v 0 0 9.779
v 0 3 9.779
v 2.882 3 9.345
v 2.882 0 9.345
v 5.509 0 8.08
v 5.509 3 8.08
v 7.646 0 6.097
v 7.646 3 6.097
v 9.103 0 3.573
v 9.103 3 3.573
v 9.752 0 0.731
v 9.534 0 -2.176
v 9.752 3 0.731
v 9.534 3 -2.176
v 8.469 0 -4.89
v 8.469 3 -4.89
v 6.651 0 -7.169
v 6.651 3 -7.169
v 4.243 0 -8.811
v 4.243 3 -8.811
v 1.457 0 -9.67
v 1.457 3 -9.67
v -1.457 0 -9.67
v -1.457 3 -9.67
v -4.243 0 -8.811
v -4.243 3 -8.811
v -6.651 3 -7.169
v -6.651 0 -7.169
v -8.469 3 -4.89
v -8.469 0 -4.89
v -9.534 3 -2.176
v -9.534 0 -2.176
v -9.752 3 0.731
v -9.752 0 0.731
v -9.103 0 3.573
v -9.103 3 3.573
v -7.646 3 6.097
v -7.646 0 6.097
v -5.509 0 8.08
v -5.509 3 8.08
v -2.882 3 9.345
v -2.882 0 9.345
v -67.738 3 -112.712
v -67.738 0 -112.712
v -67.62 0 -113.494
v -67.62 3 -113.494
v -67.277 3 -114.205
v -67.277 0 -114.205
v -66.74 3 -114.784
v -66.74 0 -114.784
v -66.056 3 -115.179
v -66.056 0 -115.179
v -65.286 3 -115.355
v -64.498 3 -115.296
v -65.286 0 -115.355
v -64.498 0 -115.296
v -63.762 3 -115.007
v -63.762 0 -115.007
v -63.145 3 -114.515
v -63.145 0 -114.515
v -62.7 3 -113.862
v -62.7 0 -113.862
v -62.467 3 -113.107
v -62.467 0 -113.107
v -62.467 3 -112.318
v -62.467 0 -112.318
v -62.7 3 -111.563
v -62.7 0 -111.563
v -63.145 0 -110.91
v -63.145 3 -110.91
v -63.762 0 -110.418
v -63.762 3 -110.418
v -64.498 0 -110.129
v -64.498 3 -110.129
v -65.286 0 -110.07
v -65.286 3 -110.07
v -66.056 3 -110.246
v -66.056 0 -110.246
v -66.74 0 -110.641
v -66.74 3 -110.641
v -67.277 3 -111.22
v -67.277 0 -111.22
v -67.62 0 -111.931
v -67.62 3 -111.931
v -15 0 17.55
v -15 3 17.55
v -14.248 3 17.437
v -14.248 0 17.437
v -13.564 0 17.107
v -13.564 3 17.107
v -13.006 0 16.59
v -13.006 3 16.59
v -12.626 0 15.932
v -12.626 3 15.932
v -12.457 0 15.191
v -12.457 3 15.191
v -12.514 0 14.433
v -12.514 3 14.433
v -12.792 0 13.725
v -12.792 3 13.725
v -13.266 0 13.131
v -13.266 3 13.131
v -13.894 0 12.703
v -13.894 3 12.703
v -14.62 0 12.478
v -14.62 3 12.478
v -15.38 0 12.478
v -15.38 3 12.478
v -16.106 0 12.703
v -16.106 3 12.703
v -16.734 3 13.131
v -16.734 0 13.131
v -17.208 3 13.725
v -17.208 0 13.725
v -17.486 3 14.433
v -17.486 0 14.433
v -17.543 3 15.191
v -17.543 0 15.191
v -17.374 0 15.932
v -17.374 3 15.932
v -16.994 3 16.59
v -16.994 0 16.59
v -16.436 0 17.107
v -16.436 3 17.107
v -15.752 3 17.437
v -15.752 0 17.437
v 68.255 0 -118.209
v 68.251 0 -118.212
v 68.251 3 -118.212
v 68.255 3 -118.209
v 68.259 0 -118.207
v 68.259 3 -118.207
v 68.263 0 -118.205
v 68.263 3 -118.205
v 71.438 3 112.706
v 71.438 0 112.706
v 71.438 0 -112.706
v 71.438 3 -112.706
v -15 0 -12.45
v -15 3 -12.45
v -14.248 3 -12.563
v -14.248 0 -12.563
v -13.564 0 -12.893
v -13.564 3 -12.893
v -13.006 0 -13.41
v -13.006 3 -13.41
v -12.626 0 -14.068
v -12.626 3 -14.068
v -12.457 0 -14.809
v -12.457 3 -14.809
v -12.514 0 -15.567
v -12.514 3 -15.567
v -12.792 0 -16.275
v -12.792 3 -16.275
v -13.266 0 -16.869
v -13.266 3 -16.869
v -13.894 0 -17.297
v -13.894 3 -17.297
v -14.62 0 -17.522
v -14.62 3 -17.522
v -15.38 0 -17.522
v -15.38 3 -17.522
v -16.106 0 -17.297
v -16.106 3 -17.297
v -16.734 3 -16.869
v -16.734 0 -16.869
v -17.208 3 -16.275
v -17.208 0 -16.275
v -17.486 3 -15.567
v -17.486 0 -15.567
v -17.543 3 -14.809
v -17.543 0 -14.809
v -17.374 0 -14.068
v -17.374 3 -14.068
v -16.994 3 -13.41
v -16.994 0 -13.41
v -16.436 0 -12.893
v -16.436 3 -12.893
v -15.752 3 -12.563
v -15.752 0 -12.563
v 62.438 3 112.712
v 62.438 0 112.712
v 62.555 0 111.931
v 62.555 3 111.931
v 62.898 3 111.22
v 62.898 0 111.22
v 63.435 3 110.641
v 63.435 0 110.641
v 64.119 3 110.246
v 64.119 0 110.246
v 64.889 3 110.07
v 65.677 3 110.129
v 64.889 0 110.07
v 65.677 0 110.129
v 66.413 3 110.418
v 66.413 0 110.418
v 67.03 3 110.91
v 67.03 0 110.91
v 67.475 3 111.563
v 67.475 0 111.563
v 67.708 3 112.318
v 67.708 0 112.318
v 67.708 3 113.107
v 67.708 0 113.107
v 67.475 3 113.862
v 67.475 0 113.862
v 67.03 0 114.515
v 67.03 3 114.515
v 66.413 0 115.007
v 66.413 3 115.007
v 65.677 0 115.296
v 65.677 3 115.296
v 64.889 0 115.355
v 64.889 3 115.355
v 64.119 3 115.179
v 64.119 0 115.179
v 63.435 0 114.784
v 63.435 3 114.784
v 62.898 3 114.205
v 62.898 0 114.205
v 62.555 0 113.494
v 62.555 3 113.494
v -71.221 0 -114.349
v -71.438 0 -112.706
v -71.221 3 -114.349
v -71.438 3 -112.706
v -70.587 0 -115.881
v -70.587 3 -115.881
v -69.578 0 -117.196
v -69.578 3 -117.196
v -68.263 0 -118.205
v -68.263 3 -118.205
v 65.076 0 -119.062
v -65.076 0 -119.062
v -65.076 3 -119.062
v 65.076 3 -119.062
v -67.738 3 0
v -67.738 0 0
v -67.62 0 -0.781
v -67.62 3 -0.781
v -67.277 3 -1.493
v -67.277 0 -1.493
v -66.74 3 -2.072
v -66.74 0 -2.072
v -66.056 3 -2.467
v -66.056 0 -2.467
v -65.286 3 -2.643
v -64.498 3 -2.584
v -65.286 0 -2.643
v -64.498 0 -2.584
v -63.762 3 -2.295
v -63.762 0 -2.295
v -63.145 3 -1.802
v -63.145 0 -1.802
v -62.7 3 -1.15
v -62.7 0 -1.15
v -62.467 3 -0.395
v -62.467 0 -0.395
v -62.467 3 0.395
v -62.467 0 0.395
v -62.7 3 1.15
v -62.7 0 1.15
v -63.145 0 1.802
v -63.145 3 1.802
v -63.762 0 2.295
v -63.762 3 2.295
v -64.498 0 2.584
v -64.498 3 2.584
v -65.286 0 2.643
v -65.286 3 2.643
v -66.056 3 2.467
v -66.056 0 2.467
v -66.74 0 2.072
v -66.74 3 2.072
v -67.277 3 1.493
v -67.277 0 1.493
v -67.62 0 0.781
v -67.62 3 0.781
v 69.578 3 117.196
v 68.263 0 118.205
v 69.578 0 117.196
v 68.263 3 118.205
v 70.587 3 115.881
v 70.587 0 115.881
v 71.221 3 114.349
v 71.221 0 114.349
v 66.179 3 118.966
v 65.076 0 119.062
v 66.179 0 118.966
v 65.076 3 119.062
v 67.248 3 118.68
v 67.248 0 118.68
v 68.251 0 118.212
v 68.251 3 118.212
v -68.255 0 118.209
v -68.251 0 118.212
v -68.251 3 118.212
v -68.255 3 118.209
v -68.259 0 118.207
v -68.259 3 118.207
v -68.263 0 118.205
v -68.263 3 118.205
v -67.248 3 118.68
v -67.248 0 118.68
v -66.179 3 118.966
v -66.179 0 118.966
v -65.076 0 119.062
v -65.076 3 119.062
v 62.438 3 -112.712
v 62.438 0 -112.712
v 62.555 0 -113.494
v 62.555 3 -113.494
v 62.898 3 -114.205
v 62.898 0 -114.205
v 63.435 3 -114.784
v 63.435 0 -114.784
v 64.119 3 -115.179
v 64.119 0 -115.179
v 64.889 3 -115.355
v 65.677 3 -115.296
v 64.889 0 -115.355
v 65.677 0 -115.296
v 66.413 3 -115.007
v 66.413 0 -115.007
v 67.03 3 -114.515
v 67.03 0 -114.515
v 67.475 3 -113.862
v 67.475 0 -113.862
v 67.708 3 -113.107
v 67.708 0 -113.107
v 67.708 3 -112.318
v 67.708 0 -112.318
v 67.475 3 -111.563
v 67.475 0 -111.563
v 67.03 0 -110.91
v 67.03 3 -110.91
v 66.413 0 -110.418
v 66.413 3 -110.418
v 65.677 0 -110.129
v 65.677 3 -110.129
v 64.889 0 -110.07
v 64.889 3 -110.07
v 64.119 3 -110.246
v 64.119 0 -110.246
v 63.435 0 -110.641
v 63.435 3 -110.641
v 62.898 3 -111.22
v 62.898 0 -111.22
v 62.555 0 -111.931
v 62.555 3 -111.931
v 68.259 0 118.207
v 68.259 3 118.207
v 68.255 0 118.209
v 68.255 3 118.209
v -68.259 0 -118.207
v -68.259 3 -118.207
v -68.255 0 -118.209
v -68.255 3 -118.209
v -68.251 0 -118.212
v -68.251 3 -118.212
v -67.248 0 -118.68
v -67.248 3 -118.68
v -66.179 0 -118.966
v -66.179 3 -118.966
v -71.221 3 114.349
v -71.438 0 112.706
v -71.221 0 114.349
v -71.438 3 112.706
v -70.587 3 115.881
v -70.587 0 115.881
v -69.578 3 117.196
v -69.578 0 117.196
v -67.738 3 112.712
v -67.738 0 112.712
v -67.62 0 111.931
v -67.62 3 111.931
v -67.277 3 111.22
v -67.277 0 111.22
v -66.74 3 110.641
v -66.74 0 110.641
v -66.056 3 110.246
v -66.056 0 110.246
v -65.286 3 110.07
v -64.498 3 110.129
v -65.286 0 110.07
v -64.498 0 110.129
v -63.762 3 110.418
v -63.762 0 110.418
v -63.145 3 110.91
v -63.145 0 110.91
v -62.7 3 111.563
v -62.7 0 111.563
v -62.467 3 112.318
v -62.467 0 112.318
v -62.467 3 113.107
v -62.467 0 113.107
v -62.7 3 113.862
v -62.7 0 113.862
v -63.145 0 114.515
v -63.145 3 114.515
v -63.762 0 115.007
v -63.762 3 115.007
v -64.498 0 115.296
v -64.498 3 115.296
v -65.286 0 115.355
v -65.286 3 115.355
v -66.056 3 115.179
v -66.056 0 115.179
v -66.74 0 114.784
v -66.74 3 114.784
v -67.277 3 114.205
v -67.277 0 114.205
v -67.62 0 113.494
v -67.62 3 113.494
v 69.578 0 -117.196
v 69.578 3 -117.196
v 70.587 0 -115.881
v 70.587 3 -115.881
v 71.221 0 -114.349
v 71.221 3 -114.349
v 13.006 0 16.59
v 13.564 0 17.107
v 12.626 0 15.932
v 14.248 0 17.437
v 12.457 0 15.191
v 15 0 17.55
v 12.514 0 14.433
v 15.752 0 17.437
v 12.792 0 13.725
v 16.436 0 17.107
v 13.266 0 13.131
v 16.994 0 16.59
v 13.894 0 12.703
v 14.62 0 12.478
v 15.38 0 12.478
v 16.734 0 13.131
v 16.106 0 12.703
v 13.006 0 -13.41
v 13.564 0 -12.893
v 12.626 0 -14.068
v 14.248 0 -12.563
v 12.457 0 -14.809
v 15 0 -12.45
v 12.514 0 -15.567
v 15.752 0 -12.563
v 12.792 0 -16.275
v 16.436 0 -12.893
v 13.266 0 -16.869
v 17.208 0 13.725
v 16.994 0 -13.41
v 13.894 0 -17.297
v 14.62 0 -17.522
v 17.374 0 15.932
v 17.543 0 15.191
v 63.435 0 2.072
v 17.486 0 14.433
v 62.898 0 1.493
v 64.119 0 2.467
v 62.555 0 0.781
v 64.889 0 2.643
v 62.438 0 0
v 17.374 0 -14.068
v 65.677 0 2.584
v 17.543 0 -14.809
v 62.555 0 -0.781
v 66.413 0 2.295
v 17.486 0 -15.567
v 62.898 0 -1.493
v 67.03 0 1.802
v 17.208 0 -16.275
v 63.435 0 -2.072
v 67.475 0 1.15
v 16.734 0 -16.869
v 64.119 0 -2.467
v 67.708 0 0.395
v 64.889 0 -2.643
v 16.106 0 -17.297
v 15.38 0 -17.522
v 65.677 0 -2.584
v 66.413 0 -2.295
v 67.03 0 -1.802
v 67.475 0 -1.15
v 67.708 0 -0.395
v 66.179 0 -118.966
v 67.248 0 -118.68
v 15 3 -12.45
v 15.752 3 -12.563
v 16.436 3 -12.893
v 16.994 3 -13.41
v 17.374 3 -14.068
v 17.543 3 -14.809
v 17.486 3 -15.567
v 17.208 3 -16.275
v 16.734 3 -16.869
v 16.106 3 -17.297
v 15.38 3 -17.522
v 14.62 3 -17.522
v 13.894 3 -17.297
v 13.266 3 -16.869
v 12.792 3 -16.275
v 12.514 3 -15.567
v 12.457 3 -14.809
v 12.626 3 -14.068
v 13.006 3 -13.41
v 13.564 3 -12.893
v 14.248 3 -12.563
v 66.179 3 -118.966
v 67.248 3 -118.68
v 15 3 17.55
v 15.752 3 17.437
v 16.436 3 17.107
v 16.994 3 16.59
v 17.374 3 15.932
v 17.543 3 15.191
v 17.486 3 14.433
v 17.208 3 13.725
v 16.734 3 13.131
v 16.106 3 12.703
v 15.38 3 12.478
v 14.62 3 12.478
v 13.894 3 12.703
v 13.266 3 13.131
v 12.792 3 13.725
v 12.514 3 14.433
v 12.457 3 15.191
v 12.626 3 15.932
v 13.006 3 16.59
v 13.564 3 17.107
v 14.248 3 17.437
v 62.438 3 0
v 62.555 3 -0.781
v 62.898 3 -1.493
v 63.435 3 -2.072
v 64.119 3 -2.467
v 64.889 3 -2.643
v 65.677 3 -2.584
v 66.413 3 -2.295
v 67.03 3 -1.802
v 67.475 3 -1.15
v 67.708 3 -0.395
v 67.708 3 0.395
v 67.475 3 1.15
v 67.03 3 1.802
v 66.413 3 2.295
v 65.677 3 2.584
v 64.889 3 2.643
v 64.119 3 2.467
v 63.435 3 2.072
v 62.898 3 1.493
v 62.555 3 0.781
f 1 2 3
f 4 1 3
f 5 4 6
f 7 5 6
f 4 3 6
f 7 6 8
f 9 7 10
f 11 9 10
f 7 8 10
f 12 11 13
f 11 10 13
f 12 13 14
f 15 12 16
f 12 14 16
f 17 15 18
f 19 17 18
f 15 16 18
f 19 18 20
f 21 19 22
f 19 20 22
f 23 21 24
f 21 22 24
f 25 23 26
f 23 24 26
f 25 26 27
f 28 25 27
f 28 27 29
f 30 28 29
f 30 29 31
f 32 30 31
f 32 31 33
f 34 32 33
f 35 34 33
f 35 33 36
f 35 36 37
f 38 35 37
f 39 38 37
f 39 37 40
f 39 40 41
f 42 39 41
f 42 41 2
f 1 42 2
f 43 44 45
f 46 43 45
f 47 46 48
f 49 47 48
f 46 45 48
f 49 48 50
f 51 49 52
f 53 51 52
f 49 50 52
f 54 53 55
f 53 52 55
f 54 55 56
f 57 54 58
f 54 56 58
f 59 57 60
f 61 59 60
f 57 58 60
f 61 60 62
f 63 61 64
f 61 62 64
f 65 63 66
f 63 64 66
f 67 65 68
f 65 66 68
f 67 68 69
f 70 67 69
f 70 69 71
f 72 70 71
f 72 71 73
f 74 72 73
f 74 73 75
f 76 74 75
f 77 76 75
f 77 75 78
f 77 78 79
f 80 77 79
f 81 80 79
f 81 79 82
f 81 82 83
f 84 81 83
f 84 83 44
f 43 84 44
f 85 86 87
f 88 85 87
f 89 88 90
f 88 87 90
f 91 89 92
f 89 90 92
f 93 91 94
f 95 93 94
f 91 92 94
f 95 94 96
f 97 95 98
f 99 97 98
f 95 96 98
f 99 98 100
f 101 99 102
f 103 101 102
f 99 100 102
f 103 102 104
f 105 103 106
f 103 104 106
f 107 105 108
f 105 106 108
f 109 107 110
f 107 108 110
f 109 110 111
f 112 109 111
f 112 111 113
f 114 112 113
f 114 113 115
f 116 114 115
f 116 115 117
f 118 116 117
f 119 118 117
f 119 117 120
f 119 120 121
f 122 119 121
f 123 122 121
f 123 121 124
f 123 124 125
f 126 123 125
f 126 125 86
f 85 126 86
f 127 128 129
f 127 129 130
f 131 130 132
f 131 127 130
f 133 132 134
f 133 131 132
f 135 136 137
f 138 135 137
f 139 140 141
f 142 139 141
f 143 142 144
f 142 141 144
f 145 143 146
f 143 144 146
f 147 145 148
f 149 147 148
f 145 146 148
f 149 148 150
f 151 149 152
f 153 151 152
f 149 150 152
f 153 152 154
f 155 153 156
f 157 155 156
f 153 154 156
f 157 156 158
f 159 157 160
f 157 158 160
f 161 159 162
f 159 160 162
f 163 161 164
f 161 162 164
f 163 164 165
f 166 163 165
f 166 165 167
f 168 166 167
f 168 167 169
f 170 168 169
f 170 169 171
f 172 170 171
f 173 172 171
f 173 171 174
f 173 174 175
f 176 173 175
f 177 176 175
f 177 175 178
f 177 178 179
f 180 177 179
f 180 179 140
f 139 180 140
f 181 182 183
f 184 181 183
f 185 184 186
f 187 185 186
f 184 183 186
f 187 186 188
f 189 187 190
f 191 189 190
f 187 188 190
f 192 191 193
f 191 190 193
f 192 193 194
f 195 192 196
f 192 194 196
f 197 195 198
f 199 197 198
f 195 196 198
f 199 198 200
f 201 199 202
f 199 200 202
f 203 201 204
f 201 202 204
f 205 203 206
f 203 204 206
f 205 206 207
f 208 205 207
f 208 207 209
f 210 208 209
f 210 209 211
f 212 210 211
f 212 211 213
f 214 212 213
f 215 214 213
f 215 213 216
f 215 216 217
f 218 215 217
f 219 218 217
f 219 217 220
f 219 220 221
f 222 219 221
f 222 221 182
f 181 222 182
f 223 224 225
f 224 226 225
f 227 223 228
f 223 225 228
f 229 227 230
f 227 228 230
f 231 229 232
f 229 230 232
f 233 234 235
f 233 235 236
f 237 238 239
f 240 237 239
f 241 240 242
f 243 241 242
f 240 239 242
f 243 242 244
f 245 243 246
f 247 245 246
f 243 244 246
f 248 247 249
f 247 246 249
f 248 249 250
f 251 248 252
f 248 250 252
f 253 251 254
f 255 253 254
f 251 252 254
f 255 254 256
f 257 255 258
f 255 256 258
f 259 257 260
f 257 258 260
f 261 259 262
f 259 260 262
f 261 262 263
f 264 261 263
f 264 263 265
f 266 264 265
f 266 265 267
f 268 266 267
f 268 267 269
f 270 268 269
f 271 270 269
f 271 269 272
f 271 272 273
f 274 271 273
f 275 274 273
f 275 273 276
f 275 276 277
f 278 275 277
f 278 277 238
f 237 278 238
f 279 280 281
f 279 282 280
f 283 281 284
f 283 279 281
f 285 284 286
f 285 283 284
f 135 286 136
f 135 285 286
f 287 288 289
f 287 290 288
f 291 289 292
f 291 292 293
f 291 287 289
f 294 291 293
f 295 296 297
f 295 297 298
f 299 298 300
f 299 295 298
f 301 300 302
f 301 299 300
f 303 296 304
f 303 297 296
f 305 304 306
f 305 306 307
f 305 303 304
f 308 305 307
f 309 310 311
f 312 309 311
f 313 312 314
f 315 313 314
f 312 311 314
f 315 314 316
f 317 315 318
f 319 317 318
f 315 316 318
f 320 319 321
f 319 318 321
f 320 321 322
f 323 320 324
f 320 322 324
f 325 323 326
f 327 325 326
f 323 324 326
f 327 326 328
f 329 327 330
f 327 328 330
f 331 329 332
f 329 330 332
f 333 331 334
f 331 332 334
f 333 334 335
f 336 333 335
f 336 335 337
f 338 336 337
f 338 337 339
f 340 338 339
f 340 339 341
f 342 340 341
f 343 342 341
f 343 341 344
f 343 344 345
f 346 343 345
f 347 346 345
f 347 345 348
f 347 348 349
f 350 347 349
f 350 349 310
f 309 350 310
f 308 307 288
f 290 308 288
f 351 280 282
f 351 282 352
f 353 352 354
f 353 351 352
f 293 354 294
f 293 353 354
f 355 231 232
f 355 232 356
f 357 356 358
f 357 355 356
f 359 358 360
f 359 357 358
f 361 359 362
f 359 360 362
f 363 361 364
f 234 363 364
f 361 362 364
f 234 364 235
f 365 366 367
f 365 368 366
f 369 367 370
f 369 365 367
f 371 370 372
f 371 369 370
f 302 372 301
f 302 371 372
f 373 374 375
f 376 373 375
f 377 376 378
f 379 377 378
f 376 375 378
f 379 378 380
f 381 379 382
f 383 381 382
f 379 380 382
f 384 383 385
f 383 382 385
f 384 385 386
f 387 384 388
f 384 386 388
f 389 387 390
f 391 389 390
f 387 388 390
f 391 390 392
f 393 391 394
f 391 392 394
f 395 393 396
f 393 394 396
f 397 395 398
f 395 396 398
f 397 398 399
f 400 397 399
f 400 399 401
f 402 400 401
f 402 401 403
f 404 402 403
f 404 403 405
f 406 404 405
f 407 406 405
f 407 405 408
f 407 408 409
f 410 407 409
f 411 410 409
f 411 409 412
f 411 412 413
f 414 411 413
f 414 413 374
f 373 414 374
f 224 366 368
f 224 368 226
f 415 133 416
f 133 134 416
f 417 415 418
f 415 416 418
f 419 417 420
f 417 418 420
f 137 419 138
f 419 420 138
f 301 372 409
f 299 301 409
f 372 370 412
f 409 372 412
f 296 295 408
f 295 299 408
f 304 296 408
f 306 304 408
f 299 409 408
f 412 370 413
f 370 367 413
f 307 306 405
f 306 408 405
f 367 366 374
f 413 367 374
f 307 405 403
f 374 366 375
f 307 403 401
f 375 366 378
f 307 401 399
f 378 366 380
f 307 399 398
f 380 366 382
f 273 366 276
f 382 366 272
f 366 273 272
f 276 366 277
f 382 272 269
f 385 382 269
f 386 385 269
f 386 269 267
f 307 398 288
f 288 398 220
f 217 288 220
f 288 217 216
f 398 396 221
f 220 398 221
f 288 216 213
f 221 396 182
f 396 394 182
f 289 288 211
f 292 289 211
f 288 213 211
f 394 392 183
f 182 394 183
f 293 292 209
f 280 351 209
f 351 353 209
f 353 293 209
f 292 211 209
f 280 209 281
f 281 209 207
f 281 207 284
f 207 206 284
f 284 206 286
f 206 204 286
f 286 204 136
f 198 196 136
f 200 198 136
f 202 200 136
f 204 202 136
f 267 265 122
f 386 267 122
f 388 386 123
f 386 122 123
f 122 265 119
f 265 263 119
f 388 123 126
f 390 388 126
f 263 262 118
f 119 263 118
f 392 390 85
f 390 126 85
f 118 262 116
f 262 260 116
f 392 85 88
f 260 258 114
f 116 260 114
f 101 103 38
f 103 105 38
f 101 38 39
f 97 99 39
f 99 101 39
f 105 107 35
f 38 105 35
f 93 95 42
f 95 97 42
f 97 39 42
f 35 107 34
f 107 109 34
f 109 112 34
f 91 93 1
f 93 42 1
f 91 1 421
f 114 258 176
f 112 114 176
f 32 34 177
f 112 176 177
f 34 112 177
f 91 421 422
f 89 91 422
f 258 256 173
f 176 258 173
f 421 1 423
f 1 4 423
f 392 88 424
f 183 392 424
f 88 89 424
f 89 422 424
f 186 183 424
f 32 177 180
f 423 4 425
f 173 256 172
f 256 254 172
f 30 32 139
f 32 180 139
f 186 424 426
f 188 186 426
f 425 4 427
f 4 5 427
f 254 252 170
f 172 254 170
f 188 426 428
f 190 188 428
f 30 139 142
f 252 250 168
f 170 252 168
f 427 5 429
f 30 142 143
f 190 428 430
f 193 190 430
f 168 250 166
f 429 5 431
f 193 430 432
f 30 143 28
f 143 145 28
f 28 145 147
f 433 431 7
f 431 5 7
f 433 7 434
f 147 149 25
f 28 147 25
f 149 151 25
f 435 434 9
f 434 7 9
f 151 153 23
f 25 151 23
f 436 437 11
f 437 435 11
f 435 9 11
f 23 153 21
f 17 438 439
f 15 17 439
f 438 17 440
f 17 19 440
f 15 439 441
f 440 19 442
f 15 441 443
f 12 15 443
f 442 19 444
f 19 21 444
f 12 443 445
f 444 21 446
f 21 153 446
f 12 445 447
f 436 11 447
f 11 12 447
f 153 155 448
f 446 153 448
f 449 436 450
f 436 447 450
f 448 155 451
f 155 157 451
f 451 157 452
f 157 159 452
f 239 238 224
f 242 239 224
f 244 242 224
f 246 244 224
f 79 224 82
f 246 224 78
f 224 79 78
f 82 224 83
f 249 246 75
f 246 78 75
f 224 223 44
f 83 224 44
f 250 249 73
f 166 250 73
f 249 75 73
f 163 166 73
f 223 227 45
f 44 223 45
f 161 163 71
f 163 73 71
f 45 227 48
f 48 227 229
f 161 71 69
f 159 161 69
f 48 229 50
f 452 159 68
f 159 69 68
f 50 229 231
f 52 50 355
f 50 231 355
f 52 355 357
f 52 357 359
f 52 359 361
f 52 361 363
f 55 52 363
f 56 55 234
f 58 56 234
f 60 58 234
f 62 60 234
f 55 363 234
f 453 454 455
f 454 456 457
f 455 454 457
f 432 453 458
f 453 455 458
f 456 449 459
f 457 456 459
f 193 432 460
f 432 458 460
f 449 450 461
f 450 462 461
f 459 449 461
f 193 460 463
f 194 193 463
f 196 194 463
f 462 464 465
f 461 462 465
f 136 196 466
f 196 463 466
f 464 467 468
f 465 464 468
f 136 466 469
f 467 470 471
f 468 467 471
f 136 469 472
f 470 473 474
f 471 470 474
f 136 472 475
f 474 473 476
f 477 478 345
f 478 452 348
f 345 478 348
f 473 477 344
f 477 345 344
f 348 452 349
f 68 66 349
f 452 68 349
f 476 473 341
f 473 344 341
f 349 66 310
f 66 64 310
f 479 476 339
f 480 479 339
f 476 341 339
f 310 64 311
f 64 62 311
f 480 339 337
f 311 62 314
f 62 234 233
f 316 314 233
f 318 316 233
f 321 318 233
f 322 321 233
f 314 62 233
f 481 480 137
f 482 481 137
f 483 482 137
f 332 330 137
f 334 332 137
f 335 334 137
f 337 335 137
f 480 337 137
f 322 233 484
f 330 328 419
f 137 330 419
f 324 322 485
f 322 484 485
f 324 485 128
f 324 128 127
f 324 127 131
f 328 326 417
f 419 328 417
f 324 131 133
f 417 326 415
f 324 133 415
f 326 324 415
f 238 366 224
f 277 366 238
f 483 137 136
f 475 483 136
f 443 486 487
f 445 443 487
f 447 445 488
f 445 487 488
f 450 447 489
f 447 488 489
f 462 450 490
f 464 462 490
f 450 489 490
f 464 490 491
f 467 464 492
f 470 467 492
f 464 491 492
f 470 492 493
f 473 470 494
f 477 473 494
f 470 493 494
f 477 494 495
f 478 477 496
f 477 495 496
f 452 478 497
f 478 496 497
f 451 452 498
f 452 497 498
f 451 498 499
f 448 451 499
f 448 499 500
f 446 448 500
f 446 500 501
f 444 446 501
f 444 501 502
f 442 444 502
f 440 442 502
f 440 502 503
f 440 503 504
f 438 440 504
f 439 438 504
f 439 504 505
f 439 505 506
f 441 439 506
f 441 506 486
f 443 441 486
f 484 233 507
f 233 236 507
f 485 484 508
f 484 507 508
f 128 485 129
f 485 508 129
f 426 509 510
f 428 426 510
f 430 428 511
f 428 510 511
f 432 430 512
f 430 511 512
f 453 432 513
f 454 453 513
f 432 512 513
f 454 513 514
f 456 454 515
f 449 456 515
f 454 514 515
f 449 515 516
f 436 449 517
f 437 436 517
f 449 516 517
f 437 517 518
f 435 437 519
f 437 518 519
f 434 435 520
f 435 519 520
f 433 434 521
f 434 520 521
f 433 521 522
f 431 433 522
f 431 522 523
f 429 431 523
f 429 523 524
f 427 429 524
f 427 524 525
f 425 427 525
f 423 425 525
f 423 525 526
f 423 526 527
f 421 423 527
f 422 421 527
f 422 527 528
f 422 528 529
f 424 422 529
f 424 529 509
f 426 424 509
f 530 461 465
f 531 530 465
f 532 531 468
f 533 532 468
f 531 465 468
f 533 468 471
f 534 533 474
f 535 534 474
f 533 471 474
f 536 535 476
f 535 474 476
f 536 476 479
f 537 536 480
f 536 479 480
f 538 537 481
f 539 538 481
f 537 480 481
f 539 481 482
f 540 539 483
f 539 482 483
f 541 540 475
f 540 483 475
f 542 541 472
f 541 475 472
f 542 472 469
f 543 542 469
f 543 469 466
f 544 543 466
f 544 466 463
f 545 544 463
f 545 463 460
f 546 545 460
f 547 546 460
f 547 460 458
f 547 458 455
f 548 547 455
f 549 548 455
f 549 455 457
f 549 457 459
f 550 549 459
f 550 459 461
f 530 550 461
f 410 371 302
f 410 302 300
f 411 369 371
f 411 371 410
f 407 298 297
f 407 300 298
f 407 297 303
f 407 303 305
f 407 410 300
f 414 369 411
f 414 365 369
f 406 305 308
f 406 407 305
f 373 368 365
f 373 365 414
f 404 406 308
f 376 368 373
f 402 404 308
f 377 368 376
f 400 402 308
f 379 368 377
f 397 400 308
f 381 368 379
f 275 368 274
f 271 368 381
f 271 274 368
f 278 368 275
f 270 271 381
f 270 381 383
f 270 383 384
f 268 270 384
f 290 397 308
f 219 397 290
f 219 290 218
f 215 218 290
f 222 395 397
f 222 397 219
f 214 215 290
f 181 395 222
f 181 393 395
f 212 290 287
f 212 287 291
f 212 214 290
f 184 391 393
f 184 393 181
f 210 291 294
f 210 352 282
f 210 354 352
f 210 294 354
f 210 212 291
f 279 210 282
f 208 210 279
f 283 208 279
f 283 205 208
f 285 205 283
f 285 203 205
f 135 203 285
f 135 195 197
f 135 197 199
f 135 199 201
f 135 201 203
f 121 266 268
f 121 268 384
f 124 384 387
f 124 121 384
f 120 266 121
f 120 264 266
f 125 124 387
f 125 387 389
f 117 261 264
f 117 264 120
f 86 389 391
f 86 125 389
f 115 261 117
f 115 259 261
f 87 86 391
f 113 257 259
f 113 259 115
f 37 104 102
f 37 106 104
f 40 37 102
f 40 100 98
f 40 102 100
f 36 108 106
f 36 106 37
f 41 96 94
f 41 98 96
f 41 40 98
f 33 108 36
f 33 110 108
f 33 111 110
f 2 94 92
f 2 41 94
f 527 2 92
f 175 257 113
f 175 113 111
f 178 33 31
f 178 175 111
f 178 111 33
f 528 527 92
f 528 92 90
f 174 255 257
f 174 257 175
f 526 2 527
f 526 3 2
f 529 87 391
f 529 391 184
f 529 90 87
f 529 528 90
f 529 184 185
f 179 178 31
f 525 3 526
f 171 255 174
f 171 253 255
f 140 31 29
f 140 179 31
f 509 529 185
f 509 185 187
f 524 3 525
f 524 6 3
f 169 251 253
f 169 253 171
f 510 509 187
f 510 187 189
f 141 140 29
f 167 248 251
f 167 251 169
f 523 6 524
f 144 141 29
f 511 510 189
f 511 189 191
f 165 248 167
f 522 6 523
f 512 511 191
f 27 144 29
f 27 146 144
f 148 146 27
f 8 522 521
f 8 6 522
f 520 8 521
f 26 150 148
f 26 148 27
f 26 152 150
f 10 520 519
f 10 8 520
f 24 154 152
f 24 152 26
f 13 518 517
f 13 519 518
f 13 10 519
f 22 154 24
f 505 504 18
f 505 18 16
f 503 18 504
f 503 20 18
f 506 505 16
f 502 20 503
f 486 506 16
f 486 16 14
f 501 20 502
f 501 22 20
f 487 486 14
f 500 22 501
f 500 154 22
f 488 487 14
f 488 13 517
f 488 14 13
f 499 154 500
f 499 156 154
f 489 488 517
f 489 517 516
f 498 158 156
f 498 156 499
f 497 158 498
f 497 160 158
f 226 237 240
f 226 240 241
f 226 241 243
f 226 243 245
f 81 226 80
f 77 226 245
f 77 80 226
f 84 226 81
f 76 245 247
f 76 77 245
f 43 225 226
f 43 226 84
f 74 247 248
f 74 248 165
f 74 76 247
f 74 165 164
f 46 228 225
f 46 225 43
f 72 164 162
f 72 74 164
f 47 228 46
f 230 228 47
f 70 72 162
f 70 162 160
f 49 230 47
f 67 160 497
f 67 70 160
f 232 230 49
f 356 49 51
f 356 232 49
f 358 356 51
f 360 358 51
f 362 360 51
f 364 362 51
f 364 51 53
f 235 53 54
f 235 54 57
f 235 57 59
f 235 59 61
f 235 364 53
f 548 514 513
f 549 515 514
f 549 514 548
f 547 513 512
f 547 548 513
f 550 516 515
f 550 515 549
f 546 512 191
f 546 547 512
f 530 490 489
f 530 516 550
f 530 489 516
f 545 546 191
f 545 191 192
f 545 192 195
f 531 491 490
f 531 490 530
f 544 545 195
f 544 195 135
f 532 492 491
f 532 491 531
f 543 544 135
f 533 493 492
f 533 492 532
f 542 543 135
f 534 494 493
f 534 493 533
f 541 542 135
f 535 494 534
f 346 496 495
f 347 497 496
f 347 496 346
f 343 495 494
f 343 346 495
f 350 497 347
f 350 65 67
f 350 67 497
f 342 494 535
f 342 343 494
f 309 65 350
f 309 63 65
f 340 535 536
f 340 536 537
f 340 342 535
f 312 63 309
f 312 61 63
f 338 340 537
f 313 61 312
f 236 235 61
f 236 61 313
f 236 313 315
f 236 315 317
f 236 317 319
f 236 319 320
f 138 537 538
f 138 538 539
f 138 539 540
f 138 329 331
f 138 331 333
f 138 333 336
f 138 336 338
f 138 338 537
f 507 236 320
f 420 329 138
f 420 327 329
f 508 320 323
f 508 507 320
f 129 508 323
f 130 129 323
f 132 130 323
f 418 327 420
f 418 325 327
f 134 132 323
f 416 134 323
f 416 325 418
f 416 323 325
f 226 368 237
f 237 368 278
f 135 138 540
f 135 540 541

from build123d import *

# Parameters (mm, degrees)
SKETCH1_W            = 142.875
SKETCH1_H            = 238.125
BOSS_EXTRUDE1_DEPTH  = 3
CUT_EXTRUDE1_START   = -3
CUT_EXTRUDE1_DEPTH   = 3
M5_CLEARANCE_HOLE1_D = 5.3
SKETCH5_R            = 9.779
SKETCH5_R_2          = 2.55
CUT_EXTRUDE2_DEPTH   = 139.881947396
FILLET1_R            = 6.35


# Read off the part's stored shape, not the designer's step: Cut-Extrude1
with BuildPart() as part:
    # Sketch1 → Boss-Extrude1 (new body)
    with BuildSketch(Plane(origin=(0, 0, 0), x_dir=(1, 0, 0), z_dir=(0, 1, 0))):
        Rectangle(SKETCH1_W, SKETCH1_H)
    extrude(amount=BOSS_EXTRUDE1_DEPTH)

    # Cut-Extrude1 outline → Cut-Extrude1 (cut)
    with BuildSketch(Plane(origin=(0, 3, 0), x_dir=(1, 0, 0), z_dir=(0, 1, 0)).offset(CUT_EXTRUDE1_START)):
        with BuildLine():
            ThreePointArc((71.4375, -116.313944107), (69.11044358, -117.711497264), (66.756056607, -119.0625))
            Line((66.756056607, -119.0625), (71.4375, -119.0625))
            Line((71.4375, -119.0625), (71.4375, -116.313944107))
        make_face()
        with BuildLine():
            Line((-71.4375, -119.0625), (-66.756056607, -119.0625))
            ThreePointArc((-66.756056607, -119.0625), (-69.11044358, -117.711497264), (-71.4375, -116.313944107))
            Line((-71.4375, -116.313944107), (-71.4375, -119.0625))
        make_face()
        with BuildLine():
            ThreePointArc((66.756056607, 119.0625), (69.11044358, 117.711497264), (71.4375, 116.313944107))
            Line((71.4375, 116.313944107), (71.4375, 119.0625))
            Line((71.4375, 119.0625), (66.756056607, 119.0625))
        make_face()
        with BuildLine():
            Line((-71.4375, 119.0625), (-71.4375, 116.313944107))
            ThreePointArc((-71.4375, 116.313944107), (-69.11044358, 117.711497264), (-66.756056607, 119.0625))
            Line((-66.756056607, 119.0625), (-71.4375, 119.0625))
        make_face()
    extrude(amount=CUT_EXTRUDE1_DEPTH, mode=Mode.SUBTRACT)

    # M5 Clearance Hole1 (through all)
    with Locations(Plane(origin=(0, 3, 0), x_dir=(1, 0, 0), z_dir=(0, 1, 0))):
        with Locations((65.0875, 0), (-65.0875, 112.7125), (65.0875, 112.7125), (65.0875, -112.7125), (-65.0875, -112.7125), (-65.0875, 0)):
            Hole(M5_CLEARANCE_HOLE1_D / 2)

    # Sketch5 → Cut-Extrude2 (cut, through all)
    with BuildSketch(Plane(origin=(0, 3, 0), x_dir=(1, 0, 0), z_dir=(0, 1, 0))):
        with Locations(Location((0, 0, 0), (0, 0, 270))):
            Circle(SKETCH5_R)
        with Locations(Location((-15, 15, 0), (0, 0, 270))):
            Circle(SKETCH5_R_2)
        with Locations(Location((15, 15, 0), (0, 0, 270))):
            Circle(SKETCH5_R_2)
        with Locations(Location((15, -15, 0), (0, 0, 270))):
            Circle(SKETCH5_R_2)
        with Locations(Location((-15, -15, 0), (0, 0, 270))):
            Circle(SKETCH5_R_2)
    extrude(amount=-CUT_EXTRUDE2_DEPTH, mode=Mode.SUBTRACT)

    # Fillet1
    fillet1_edges = [part.edges().sort_by_distance(p)[0] for p in [
        (71.4375, 1.5, 116.313944107),
        (71.4375, 1.5, -116.313944107),
        (66.756056607, 1.5, -119.0625),
        (-66.756056607, 1.5, -119.0625),
        (-71.4375, 1.5, -116.313944107),
        (-71.4375, 1.5, 116.313944107),
        (-66.756056607, 1.5, 119.0625),
        (66.756056607, 1.5, 119.0625),
    ]]
    fillet(fillet1_edges, radius=FILLET1_R)


solid = part.part
